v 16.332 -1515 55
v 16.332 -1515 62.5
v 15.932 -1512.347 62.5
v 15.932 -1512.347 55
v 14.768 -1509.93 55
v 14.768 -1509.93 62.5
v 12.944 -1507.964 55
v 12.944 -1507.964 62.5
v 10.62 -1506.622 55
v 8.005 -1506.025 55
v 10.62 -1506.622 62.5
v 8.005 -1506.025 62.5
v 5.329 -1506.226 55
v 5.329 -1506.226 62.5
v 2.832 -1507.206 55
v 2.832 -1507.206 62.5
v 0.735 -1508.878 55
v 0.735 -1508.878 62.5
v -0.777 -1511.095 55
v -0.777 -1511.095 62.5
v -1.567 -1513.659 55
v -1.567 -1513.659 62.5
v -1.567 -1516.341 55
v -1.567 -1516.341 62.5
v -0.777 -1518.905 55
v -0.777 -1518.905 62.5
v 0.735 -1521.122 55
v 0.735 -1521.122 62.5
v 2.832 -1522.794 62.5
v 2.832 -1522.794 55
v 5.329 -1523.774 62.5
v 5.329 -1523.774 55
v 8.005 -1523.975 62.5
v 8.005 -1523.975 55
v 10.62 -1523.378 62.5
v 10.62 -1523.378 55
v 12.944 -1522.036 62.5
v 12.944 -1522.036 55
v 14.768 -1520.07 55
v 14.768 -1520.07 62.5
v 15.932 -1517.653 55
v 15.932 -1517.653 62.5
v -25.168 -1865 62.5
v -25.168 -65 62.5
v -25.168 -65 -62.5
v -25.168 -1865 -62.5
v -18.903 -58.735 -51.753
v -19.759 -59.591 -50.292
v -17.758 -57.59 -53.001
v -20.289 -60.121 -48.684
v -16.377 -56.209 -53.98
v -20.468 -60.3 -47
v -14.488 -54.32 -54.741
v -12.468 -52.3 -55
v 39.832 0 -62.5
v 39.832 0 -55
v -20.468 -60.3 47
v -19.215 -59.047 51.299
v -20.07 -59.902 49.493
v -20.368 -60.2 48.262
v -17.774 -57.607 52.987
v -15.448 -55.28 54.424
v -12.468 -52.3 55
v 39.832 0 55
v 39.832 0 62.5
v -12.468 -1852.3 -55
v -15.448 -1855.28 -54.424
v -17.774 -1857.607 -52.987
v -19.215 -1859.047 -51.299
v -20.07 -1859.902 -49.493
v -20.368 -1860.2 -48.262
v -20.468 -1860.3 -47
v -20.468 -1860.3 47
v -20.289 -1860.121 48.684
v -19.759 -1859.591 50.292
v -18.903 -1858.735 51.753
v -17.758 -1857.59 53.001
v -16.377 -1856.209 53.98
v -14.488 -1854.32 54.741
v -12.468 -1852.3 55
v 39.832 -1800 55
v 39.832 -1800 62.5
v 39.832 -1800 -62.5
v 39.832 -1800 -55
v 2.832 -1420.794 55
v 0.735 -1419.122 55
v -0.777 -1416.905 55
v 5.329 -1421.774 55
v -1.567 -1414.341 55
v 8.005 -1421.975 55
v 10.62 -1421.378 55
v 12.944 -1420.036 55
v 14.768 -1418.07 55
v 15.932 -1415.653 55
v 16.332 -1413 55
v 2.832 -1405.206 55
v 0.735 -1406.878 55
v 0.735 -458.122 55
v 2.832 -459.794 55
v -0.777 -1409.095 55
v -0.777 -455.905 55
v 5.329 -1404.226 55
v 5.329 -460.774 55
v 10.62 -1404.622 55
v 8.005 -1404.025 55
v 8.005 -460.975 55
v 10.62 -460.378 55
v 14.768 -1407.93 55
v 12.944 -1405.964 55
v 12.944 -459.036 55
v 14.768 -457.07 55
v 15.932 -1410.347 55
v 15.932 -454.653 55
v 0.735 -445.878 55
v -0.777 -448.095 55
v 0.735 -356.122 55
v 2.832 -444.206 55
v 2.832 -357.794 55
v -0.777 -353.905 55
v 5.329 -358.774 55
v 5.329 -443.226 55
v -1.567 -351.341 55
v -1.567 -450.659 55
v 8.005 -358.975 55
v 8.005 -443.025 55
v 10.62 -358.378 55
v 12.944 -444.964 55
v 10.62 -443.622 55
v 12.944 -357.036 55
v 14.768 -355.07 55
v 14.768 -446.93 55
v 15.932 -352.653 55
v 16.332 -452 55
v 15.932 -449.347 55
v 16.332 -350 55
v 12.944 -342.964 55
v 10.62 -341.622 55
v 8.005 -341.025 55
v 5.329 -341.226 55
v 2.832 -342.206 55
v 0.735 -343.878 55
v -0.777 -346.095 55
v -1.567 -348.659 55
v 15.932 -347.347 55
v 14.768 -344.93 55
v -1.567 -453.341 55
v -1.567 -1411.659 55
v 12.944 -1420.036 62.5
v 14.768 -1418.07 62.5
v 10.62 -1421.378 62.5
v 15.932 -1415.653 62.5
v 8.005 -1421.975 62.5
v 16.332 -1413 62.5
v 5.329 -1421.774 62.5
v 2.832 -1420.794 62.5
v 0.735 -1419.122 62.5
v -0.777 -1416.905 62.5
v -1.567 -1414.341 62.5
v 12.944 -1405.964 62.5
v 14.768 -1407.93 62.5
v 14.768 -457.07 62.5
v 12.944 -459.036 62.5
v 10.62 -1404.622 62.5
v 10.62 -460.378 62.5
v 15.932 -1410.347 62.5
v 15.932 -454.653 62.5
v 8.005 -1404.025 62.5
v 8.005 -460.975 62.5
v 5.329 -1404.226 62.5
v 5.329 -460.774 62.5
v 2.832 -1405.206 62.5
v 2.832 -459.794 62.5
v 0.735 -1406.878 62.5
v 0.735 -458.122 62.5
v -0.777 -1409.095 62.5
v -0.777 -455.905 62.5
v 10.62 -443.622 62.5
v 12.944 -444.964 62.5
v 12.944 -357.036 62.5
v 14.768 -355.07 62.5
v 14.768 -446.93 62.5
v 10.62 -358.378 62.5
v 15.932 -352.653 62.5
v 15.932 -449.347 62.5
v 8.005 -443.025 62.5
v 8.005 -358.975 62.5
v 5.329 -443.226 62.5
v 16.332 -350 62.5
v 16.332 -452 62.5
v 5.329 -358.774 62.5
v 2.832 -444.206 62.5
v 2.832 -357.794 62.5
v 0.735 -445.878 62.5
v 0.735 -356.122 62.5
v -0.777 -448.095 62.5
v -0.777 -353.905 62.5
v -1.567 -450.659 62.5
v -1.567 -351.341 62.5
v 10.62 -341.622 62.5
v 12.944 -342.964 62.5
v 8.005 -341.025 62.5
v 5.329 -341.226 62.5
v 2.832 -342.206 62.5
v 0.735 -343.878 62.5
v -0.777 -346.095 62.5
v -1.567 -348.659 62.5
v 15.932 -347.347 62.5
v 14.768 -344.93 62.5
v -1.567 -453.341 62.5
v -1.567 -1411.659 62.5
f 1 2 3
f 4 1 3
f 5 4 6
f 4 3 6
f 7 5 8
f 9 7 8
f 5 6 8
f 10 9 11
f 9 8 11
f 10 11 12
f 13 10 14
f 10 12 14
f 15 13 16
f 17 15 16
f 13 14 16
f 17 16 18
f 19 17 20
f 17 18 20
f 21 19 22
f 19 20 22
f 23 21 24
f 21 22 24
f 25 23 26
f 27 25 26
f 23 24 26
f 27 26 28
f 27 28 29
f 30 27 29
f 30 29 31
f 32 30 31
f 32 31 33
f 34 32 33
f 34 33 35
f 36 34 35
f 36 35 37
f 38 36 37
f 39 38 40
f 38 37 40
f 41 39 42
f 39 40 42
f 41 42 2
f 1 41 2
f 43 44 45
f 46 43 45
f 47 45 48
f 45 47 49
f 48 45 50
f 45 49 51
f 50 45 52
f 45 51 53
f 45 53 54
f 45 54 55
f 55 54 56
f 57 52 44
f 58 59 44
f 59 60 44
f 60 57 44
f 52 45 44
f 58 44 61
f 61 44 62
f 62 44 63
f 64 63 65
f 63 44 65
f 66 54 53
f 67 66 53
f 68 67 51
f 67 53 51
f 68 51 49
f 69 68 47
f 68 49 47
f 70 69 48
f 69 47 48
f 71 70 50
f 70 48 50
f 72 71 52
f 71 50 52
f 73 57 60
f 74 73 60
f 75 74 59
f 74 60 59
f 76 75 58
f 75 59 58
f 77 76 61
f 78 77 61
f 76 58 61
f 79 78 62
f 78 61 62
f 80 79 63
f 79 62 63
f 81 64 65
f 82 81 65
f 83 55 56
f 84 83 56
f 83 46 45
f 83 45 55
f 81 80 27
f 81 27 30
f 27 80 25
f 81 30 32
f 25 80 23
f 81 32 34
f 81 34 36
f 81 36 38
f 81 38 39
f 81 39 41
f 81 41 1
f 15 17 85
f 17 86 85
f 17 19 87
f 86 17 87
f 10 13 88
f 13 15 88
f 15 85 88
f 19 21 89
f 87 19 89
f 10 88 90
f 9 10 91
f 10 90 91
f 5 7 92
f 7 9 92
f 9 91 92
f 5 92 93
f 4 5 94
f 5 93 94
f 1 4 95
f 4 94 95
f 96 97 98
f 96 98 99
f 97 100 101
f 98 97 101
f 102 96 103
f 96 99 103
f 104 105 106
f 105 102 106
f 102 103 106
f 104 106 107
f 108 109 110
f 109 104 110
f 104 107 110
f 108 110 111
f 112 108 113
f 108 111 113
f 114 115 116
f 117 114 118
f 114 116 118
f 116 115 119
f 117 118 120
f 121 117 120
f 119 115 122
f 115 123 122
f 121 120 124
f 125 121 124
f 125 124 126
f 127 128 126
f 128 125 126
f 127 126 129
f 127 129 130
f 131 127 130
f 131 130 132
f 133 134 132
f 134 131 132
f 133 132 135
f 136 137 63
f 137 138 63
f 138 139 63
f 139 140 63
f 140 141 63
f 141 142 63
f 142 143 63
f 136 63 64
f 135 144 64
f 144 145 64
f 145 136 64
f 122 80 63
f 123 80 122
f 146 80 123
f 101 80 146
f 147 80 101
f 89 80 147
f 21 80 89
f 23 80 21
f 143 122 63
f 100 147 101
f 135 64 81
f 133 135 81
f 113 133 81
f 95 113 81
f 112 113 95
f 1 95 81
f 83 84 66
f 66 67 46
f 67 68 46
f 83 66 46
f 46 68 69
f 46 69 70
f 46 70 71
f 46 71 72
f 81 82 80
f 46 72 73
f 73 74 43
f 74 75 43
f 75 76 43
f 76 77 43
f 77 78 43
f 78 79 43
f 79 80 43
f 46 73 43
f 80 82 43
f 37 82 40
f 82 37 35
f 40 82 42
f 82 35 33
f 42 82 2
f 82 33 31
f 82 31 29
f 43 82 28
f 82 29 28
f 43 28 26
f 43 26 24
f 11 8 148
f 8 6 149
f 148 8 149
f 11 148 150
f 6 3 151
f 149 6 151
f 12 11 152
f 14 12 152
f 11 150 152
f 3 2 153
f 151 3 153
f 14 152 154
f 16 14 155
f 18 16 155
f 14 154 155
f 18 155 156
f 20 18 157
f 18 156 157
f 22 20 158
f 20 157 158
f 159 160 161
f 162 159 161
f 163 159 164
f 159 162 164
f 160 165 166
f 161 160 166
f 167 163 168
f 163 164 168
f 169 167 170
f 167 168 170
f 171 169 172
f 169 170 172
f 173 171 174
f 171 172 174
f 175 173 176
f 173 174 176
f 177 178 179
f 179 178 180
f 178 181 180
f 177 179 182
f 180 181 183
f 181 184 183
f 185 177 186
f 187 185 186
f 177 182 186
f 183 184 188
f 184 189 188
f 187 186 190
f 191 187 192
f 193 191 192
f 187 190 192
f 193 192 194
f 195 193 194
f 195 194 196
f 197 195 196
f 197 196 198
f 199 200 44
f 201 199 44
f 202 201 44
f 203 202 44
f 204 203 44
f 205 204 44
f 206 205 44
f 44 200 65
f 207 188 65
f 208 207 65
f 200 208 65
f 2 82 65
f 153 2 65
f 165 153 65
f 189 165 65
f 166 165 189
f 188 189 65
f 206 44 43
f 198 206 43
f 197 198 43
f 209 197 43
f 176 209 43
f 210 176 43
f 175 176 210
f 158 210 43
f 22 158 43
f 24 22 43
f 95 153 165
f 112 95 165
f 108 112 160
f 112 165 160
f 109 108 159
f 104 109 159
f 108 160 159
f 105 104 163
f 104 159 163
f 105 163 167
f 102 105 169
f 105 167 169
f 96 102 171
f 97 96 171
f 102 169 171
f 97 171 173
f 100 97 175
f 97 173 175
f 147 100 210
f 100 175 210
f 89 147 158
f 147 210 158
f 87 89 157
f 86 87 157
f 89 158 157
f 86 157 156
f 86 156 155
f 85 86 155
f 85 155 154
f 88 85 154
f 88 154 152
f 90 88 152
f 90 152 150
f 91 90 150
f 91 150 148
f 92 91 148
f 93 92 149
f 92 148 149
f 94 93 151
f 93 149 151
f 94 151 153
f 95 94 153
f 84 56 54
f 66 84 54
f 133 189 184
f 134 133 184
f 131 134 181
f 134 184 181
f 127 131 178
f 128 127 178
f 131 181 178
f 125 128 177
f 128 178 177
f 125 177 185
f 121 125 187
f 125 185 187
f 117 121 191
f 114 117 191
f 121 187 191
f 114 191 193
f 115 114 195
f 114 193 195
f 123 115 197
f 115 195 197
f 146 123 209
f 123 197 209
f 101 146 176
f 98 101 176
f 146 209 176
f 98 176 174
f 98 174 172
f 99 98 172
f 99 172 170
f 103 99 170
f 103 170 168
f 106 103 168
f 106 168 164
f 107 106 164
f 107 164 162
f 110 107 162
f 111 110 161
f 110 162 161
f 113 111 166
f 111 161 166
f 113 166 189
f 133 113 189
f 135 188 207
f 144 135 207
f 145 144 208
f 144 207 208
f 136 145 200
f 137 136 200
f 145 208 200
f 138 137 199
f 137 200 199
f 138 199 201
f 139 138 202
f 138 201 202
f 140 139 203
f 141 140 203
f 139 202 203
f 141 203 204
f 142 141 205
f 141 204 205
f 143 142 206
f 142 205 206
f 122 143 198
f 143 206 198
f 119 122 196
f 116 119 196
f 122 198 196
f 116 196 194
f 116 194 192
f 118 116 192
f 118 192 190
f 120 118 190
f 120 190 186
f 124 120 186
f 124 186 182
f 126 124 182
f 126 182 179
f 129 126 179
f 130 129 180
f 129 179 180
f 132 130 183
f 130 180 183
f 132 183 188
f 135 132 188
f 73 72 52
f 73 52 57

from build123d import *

# Parameters (mm, degrees)
F1_DEPTH = 1865
F3_DEPTH = 125.001
F4_R     = 9
F5_DEPTH = 7.5


with BuildPart() as f1:
    # F0 (on Front) → F1 (new body)
    with BuildSketch(Plane.XZ):
        with BuildLine():
            Line((-25.16784, 62.5), (-25.16784, -62.5))
            Line((-25.16784, -62.5), (39.83216, -62.5))
            Line((39.83216, -62.5), (39.83216, -55))
            Line((39.83216, -55), (-12.46784, -55))
            ThreePointArc((-12.46784, -55), (-18.124695, -52.656854), (-20.46784, -47))
            Line((-20.46784, -47), (-20.46784, 47))
            ThreePointArc((-20.46784, 47), (-18.124695, 52.656854), (-12.46784, 55))
            Line((-12.46784, 55), (39.83216, 55))
            Line((39.83216, 55), (39.83216, 62.5))
            Line((39.83216, 62.5), (-25.16784, 62.5))
        make_face()
    extrude(amount=F1_DEPTH)

    # F2 (on face) → F3 (cut, through all)
    with BuildSketch(Plane.XY.offset(62.5)):
        Polygon((39.83216, -1800), (-25.16784, -1865), (39.83216, -1865), align=None)
        Polygon((39.83216, 0), (-25.16784, 0), (-25.16784, -65), align=None)
    extrude(amount=-F3_DEPTH, mode=Mode.SUBTRACT)

    # F4 (on face) → F5 (cut, through all)
    with BuildSketch(Plane.XY.offset(62.5)):
        with Locations((7.33216, -350)):
            Circle(F4_R)
        with Locations((7.33216, -452)):
            Circle(F4_R)
        with Locations((7.33216, -1515)):
            Circle(F4_R)
        with Locations((7.33216, -1413)):
            Circle(F4_R)
    extrude(amount=-F5_DEPTH, mode=Mode.SUBTRACT)


solid = f1.part
